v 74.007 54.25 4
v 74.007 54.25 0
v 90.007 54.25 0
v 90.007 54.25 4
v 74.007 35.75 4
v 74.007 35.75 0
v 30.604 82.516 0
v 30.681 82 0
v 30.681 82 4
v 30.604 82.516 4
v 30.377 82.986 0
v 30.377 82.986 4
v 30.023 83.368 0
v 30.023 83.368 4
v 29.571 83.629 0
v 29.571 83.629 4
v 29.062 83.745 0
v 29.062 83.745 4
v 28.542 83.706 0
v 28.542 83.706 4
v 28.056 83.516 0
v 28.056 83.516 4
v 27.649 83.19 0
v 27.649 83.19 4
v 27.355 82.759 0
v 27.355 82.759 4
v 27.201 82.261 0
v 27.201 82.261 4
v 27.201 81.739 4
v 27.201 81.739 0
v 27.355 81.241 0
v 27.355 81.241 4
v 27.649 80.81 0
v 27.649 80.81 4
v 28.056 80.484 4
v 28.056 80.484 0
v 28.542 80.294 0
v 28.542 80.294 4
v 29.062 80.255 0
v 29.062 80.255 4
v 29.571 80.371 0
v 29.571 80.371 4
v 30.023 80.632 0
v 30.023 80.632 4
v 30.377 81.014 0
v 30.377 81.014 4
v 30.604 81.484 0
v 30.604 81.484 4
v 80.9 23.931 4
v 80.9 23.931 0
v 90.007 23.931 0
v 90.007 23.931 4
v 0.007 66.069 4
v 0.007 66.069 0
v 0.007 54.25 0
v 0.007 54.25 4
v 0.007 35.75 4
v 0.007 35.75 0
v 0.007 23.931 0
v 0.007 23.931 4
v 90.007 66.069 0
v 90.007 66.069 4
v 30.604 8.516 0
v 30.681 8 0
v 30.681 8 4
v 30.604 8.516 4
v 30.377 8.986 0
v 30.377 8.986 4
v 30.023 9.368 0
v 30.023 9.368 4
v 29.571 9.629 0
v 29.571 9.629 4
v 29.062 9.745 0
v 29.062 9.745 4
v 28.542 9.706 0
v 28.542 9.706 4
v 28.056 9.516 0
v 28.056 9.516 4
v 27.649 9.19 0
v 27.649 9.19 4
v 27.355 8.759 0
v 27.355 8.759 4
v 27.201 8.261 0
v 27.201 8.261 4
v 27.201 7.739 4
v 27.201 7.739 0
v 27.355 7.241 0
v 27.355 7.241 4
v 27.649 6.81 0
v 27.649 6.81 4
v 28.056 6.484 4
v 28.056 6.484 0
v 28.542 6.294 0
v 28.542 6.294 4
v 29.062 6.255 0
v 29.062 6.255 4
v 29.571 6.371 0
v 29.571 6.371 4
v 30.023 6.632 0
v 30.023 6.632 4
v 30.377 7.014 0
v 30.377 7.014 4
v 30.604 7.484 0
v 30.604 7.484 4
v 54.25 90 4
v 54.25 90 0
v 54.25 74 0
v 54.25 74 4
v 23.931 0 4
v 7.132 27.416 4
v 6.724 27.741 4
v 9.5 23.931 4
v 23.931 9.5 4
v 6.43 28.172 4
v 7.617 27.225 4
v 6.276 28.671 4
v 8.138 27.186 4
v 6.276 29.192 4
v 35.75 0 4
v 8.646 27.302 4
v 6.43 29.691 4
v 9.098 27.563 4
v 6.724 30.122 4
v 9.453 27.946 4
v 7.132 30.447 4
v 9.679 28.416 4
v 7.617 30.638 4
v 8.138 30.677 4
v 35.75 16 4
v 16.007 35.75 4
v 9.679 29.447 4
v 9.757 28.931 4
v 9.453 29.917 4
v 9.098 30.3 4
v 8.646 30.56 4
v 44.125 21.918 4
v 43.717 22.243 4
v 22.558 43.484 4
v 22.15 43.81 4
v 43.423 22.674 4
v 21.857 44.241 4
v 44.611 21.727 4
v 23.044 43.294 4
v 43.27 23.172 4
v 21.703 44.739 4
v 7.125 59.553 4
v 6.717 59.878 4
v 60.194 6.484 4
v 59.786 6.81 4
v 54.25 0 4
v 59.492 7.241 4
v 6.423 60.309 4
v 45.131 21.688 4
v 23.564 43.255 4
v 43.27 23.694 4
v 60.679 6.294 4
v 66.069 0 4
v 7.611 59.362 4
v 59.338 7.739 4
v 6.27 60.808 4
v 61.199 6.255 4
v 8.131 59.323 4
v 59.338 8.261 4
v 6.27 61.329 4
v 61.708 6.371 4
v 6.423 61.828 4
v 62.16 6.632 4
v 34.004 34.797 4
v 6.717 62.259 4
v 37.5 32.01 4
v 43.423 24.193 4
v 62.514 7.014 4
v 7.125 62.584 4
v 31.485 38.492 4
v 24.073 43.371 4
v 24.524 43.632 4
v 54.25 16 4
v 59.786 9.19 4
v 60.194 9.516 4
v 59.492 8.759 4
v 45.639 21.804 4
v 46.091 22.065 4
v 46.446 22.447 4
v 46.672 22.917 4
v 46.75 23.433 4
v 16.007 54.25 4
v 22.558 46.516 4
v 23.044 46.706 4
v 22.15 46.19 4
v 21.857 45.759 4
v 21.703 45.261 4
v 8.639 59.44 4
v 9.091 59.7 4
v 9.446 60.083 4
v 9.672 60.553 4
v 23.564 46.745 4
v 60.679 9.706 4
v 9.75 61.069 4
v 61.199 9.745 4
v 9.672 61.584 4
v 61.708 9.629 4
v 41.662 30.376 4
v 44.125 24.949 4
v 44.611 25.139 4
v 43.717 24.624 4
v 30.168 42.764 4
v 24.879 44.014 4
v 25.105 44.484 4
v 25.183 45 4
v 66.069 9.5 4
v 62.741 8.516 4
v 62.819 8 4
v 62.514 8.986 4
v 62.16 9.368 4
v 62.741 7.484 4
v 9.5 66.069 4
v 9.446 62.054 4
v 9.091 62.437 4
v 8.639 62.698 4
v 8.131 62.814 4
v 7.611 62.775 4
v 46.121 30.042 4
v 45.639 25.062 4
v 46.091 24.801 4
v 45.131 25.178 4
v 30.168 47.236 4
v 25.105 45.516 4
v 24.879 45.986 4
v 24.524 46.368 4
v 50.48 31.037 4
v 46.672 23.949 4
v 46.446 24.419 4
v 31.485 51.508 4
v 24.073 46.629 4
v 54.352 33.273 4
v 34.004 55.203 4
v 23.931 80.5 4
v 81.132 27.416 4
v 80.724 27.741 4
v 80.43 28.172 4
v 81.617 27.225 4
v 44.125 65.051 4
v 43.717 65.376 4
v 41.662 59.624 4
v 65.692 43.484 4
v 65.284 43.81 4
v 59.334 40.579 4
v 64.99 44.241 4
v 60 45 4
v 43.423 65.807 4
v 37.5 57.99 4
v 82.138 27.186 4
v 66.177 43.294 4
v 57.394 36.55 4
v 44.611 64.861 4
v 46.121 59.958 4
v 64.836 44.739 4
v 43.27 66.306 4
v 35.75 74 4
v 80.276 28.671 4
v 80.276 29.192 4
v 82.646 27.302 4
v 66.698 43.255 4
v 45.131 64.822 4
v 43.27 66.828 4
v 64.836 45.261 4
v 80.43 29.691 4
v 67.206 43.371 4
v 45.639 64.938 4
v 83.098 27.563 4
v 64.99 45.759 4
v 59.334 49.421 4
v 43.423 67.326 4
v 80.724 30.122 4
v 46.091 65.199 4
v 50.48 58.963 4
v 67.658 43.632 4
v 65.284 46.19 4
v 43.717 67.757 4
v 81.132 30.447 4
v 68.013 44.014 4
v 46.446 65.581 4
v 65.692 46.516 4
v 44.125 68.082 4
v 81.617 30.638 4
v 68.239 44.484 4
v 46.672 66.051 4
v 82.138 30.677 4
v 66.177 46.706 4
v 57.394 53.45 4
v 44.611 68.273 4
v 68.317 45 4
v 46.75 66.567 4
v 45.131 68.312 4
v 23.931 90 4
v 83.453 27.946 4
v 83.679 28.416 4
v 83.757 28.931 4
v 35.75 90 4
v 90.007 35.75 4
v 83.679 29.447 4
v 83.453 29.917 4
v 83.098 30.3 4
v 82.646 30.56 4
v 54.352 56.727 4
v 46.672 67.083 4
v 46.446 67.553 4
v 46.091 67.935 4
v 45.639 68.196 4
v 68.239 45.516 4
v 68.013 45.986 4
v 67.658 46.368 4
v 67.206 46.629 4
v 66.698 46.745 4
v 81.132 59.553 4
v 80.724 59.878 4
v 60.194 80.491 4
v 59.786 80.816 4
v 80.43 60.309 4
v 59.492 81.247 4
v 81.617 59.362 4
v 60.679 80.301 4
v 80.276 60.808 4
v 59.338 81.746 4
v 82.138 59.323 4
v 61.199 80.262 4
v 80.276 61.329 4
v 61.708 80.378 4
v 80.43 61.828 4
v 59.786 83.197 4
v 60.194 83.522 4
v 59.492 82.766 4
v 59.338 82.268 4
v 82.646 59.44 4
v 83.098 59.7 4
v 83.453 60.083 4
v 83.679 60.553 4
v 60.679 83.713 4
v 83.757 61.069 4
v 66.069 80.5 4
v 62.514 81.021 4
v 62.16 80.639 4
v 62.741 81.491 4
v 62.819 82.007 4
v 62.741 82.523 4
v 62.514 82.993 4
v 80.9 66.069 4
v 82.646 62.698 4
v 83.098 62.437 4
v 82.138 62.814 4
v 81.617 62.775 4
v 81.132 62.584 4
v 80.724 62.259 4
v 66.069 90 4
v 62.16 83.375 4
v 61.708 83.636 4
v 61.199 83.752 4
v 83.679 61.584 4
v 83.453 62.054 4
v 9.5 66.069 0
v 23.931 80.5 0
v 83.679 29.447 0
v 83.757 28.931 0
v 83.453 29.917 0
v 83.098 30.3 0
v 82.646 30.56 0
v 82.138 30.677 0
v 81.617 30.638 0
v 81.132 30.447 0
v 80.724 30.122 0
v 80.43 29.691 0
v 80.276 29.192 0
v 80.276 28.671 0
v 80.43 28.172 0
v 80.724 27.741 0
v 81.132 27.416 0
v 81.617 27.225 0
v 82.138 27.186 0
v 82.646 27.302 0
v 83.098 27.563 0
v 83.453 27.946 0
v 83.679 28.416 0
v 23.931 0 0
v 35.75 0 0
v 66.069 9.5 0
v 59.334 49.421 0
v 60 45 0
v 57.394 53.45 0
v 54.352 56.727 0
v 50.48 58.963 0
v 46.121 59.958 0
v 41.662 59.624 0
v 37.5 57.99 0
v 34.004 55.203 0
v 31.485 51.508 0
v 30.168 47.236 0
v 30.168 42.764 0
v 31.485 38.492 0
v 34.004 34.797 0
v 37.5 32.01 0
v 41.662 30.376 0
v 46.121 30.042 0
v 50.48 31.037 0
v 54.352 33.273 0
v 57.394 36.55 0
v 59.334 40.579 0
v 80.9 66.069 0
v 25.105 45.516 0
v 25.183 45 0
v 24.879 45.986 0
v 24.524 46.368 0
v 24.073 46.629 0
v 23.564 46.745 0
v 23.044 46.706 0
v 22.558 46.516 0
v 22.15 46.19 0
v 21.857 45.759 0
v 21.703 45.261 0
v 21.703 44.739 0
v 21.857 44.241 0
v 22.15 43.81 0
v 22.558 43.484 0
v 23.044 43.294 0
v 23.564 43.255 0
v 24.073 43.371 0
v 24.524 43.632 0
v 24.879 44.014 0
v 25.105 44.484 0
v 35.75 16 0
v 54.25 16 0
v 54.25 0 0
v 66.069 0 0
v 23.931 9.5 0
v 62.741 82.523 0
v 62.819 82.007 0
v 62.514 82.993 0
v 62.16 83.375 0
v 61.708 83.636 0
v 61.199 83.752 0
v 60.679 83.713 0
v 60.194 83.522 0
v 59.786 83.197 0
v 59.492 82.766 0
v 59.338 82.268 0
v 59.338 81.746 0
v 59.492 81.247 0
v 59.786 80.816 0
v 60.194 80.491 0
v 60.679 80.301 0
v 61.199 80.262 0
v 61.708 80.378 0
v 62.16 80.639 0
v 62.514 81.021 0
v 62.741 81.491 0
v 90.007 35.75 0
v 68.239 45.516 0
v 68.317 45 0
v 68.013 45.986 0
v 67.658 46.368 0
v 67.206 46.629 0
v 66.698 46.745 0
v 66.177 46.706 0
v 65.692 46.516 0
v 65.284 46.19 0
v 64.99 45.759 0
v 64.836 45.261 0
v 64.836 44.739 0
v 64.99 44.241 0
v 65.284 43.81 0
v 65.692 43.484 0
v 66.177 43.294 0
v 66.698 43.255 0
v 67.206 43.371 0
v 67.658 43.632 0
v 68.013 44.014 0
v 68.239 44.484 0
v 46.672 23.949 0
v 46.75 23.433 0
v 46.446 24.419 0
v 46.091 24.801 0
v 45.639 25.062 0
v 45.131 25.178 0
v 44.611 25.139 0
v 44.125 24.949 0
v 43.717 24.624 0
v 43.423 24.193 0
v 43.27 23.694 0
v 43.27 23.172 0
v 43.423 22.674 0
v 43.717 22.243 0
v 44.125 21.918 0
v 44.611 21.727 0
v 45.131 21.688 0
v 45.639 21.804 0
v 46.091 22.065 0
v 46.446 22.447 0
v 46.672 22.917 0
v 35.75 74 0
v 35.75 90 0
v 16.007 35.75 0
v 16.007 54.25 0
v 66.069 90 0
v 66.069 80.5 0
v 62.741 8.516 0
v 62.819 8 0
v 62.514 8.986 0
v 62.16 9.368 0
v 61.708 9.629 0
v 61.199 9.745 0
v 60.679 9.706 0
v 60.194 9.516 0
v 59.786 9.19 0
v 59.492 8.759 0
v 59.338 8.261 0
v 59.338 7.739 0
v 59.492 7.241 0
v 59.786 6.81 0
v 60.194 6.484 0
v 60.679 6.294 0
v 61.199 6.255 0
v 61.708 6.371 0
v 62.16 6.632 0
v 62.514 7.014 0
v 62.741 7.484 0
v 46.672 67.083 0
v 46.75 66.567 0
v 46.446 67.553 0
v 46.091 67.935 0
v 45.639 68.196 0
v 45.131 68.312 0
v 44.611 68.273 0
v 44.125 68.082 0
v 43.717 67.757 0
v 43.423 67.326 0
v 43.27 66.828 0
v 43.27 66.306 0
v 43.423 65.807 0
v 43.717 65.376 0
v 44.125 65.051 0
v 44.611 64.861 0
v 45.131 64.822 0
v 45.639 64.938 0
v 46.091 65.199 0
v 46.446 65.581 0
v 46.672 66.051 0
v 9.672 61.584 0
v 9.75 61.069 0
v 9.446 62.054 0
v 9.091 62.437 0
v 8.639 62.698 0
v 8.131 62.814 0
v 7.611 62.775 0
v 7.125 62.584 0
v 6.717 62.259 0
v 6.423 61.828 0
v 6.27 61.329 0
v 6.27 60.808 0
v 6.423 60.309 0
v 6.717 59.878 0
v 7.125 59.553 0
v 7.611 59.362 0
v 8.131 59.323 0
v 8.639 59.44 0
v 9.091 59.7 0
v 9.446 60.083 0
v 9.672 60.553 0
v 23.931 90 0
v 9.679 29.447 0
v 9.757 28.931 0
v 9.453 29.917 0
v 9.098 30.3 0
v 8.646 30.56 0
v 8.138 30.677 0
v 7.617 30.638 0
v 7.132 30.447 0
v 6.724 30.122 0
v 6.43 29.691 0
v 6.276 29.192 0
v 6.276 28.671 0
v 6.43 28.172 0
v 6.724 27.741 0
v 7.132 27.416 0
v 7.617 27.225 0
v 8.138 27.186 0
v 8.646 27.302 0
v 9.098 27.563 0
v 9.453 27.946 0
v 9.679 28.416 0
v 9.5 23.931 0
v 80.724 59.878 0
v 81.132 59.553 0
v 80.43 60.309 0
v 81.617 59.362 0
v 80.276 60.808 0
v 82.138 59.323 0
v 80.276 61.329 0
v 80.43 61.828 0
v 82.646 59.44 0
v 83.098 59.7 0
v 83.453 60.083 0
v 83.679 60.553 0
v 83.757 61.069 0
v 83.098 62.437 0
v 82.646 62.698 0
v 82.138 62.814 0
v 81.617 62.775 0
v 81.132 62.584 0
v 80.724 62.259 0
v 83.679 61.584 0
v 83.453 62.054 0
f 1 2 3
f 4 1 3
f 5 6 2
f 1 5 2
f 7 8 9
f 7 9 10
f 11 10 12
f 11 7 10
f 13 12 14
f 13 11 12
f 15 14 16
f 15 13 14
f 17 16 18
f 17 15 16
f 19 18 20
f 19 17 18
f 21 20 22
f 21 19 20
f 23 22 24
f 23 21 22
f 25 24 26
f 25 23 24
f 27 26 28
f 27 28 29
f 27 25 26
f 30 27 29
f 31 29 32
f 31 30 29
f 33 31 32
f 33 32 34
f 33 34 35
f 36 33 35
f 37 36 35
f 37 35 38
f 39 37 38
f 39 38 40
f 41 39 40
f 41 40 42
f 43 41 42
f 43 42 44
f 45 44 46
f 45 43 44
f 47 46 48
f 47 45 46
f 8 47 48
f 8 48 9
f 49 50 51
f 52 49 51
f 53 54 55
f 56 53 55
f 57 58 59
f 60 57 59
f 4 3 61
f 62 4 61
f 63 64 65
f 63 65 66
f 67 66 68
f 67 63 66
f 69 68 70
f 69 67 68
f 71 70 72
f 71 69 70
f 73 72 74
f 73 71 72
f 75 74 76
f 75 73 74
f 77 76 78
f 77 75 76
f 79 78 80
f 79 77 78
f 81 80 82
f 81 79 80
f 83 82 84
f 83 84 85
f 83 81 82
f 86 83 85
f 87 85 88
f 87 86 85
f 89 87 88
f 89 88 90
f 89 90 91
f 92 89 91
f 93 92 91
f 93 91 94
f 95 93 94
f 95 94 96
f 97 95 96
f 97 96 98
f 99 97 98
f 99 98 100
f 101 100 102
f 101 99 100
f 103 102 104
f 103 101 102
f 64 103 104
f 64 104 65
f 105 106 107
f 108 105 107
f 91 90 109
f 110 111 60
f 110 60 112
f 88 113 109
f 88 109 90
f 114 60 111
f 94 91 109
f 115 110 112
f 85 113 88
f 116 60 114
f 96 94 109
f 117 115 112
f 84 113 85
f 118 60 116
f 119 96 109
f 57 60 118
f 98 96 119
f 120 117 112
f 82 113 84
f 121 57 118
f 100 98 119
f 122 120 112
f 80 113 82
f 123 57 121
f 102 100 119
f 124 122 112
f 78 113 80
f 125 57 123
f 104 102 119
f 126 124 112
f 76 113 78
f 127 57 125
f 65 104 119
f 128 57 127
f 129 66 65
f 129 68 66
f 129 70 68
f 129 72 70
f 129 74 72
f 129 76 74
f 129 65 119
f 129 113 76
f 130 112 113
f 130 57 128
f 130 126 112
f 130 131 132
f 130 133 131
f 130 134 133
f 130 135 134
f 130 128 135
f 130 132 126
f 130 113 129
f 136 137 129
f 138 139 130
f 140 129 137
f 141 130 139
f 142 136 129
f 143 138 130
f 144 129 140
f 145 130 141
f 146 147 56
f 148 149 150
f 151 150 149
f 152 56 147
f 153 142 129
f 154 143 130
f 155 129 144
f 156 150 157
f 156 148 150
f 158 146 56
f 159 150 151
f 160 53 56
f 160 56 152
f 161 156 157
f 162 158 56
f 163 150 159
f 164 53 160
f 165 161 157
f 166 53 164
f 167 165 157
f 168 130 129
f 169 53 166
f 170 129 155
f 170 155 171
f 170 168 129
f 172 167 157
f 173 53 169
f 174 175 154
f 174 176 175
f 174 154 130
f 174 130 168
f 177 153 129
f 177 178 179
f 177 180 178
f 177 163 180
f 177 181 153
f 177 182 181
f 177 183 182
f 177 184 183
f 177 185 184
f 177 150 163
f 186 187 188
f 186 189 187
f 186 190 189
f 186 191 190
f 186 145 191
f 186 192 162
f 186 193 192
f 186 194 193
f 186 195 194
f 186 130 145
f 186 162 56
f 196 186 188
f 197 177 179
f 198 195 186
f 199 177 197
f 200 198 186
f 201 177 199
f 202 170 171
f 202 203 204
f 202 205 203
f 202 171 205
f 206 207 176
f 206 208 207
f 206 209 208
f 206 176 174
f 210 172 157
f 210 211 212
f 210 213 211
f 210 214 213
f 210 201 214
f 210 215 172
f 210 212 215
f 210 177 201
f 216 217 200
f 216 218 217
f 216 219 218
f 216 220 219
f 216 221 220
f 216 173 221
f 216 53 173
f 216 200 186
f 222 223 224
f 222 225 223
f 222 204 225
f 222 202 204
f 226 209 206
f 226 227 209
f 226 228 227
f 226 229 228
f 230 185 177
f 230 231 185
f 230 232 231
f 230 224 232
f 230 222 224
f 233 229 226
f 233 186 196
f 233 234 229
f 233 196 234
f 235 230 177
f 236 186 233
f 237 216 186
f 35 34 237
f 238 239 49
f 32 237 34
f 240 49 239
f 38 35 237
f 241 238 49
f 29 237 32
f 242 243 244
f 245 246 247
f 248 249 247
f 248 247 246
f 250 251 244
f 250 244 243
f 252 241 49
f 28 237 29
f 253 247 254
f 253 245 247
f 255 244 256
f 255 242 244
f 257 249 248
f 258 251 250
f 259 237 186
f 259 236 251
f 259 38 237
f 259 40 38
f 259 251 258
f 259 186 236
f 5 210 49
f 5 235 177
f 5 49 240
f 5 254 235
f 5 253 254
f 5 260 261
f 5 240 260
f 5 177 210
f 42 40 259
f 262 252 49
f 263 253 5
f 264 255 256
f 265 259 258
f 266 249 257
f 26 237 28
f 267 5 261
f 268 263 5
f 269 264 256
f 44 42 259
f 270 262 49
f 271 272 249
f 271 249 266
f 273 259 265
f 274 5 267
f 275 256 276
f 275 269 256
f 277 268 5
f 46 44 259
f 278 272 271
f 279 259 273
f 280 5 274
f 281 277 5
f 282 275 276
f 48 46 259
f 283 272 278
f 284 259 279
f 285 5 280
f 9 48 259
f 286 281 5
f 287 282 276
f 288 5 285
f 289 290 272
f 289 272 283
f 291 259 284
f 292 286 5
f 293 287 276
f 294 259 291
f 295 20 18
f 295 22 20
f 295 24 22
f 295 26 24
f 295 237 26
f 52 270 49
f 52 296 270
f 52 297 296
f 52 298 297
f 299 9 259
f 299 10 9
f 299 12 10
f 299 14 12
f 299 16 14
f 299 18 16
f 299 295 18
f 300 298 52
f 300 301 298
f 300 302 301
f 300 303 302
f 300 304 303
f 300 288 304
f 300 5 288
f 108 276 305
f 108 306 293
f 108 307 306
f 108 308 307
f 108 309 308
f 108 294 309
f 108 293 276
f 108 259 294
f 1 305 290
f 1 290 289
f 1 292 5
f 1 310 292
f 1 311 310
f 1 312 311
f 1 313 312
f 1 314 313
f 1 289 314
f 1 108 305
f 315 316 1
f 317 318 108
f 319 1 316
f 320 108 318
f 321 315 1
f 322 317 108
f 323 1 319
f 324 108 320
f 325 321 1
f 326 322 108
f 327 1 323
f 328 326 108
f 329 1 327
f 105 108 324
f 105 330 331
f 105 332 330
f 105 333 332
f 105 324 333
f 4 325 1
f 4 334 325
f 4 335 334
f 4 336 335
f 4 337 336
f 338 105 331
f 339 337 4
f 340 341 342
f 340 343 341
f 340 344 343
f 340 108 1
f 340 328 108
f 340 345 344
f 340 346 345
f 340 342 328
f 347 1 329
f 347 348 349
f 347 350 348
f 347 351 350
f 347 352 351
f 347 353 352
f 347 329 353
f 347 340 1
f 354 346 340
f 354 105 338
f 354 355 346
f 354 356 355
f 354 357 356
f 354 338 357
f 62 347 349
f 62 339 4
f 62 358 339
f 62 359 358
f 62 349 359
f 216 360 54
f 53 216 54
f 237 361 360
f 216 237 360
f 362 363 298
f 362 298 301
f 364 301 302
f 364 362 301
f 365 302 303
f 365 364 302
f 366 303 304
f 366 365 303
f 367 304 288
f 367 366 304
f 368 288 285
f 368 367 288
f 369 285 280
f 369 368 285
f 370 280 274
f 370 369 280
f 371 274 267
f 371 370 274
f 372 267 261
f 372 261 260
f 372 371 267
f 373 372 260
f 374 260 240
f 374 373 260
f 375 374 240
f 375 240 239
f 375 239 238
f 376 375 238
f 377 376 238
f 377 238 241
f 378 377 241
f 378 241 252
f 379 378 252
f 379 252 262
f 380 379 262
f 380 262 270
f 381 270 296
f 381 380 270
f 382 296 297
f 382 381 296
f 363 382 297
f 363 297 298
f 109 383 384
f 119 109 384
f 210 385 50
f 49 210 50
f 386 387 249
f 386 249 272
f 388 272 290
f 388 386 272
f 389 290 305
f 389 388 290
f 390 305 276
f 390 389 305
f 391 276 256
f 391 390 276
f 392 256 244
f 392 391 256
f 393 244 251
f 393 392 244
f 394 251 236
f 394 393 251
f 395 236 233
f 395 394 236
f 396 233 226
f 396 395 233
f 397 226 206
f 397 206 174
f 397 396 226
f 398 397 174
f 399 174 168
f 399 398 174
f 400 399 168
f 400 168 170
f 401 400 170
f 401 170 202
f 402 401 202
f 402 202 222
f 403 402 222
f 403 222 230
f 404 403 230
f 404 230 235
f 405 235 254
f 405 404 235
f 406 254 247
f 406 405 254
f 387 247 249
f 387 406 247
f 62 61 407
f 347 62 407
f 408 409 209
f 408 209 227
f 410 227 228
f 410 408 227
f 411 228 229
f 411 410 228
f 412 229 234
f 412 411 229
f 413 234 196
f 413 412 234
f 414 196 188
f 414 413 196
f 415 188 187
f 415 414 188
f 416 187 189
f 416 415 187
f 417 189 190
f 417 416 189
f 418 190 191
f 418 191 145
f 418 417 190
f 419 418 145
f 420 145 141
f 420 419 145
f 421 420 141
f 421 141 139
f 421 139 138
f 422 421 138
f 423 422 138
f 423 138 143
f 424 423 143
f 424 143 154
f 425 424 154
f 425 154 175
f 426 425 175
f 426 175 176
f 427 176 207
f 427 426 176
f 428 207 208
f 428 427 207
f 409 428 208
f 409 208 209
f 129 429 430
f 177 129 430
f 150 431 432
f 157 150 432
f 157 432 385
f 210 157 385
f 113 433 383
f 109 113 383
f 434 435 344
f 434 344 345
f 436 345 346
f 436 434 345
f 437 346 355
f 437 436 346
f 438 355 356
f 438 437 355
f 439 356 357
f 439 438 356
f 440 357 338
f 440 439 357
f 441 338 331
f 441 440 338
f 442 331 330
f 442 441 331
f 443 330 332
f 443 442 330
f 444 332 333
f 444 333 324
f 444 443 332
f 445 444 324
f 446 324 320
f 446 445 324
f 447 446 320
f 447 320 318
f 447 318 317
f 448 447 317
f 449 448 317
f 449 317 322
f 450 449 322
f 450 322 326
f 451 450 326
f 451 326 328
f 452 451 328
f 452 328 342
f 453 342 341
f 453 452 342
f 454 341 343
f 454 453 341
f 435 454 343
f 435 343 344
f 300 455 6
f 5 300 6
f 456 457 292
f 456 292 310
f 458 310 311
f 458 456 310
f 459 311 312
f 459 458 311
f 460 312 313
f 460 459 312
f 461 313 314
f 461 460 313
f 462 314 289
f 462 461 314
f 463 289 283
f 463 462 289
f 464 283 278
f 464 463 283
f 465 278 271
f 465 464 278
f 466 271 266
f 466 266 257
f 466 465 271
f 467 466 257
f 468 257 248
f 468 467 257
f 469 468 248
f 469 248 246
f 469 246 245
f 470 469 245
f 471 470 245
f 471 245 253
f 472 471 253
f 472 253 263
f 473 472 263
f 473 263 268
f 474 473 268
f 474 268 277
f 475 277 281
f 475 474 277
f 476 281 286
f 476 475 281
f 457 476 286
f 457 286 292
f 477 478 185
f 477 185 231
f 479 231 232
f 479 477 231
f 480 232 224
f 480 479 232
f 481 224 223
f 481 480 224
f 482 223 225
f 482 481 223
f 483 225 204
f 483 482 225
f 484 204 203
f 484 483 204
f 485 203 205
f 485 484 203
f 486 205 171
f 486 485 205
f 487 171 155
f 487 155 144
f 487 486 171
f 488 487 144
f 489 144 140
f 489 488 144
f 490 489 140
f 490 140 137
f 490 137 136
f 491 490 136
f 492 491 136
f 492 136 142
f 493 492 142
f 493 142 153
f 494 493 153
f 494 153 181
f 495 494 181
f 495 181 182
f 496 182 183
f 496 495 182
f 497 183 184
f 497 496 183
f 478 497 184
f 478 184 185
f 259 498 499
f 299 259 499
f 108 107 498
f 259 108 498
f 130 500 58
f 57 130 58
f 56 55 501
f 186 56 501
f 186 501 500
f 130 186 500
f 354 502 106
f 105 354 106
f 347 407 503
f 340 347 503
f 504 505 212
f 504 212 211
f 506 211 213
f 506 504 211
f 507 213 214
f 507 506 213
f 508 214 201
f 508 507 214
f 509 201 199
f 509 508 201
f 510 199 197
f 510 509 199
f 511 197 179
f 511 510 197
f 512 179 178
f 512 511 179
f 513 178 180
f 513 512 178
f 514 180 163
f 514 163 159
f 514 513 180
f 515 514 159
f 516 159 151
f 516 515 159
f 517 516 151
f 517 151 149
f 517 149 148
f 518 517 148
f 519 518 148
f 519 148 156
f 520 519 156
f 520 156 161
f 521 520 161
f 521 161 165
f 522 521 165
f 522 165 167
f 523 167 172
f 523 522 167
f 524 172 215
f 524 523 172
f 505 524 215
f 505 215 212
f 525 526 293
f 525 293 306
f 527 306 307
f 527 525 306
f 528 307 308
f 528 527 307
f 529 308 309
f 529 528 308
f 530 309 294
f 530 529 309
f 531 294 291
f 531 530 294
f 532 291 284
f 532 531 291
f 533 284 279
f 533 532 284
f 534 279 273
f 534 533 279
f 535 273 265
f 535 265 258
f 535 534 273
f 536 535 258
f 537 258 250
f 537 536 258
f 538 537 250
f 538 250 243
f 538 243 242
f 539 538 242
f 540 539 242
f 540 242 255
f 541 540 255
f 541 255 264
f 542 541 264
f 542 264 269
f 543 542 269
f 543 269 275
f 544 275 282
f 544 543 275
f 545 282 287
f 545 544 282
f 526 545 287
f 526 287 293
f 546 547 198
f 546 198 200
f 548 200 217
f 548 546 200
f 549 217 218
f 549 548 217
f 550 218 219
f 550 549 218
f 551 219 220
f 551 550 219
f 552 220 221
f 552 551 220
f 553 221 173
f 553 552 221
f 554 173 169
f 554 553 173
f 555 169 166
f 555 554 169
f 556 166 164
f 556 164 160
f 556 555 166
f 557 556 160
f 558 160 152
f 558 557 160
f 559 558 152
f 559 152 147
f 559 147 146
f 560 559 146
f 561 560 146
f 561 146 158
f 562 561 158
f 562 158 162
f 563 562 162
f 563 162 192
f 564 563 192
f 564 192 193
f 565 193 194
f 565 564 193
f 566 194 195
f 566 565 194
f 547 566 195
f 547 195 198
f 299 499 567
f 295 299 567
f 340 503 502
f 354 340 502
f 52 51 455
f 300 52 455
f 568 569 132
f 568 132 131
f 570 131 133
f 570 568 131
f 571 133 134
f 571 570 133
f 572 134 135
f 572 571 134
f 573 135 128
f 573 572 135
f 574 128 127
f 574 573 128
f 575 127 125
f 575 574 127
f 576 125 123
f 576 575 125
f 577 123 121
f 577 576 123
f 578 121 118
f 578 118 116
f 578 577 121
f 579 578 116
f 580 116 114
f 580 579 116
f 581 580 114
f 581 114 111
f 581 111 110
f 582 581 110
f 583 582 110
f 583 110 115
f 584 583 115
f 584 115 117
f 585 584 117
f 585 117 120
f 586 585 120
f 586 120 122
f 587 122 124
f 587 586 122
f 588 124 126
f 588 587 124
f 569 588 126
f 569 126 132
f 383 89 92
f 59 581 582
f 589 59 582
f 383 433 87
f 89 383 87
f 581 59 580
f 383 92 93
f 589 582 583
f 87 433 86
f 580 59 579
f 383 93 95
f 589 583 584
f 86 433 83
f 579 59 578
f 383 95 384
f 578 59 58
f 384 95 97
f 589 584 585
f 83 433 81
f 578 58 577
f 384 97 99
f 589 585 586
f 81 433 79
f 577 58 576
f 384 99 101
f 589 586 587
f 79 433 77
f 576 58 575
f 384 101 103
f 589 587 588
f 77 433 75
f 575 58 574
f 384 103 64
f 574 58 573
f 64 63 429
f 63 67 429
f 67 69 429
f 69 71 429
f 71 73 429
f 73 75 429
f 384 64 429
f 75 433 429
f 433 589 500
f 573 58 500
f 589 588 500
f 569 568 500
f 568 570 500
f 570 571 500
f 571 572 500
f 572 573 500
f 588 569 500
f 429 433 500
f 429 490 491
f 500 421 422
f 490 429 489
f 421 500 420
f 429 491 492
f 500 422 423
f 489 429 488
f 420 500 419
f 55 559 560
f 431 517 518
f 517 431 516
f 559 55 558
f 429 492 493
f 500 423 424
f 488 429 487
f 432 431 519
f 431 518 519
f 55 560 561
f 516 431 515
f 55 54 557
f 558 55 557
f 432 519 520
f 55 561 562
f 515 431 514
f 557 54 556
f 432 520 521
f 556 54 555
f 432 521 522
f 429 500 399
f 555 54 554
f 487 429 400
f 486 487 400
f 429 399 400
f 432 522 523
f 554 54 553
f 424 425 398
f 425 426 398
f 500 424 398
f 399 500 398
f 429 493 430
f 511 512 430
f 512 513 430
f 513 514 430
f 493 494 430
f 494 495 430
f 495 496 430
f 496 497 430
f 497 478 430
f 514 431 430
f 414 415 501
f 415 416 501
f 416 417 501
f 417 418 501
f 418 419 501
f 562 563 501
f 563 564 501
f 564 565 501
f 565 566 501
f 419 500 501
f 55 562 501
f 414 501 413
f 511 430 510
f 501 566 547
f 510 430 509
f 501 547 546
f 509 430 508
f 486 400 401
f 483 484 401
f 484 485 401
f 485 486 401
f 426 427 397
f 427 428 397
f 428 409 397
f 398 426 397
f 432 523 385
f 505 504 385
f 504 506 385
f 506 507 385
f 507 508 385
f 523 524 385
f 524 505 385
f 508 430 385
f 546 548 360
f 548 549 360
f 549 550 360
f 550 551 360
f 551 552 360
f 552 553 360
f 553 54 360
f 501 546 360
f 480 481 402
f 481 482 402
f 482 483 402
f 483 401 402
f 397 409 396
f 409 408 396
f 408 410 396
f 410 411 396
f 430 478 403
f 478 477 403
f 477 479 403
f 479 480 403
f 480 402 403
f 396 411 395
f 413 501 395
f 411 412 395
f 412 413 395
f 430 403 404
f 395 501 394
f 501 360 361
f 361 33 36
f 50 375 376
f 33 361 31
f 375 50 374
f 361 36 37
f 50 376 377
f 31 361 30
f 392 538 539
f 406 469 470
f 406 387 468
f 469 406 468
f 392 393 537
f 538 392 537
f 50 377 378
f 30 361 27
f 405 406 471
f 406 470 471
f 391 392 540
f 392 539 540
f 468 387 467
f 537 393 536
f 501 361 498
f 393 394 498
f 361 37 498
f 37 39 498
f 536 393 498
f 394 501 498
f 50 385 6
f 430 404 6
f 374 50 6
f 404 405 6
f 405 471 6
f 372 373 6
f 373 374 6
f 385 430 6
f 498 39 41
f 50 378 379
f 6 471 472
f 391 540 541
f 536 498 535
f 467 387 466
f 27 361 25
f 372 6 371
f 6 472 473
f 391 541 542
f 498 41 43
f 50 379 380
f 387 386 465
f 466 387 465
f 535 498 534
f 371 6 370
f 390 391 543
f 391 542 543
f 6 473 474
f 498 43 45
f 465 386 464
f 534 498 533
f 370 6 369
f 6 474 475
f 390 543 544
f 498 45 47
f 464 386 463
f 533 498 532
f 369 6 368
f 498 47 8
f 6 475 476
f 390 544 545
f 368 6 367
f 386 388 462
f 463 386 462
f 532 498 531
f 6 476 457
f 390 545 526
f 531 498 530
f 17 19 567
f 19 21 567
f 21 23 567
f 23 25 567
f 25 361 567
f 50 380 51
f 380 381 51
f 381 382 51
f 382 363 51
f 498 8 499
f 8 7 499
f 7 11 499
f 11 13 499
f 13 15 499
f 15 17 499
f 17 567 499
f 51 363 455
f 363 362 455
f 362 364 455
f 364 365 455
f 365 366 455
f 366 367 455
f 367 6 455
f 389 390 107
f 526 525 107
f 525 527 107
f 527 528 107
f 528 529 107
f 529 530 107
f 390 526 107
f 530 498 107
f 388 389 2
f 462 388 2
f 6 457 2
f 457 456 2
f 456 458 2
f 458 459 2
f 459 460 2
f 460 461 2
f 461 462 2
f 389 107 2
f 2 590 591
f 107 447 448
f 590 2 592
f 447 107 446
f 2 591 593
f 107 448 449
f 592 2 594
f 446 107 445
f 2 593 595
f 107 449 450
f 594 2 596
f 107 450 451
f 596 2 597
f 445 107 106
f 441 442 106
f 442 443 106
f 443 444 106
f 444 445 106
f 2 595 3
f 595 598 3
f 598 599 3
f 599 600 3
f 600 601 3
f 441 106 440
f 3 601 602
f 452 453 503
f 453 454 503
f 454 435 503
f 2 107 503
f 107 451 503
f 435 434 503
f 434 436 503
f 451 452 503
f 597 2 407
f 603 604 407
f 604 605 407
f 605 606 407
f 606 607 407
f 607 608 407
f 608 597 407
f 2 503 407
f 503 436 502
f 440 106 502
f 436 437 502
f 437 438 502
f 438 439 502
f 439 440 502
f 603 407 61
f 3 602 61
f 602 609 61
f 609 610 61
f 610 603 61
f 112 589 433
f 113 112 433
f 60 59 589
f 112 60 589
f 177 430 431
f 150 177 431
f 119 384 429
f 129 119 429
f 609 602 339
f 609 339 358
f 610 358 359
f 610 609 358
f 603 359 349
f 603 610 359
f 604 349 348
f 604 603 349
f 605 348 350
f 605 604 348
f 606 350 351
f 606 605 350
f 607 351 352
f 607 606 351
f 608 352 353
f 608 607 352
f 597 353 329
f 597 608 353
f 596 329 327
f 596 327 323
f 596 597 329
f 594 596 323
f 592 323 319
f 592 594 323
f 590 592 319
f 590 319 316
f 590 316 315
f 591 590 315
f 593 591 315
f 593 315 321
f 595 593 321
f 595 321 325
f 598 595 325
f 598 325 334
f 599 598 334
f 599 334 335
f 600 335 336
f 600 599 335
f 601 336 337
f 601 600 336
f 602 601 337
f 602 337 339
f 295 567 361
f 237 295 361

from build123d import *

# Parameters (mm, degrees)
F0_R     = 1.75
F0_R_2   = 15
F1_DEPTH = 4


with BuildPart() as f1:
    # F0 (on Top) → F1 (new body)
    with BuildSketch(Plane.XY):
        Polygon((23.931458, 9.5), (23.931458, 0), (35.75, 0), (35.75, 16), (54.25, 16), (54.25, 0), (66.068542, 0), (66.068542, 9.5), (80.900239, 23.931458), (90.006756, 23.931458), (90.006756, 35.75), (74.006756, 35.75), (74.006756, 54.25), (90.006756, 54.25), (90.006756, 66.068542), (80.900239, 66.068542), (66.068542, 80.5), (66.068542, 90), (54.25, 90), (54.25, 74), (35.75, 74), (35.75, 90), (23.931458, 90), (23.931458, 80.5), (9.5, 66.068542), (0.006756, 66.068542), (0.006756, 54.25), (16.006756, 54.25), (16.006756, 35.75), (0.006756, 35.75), (0.006756, 23.931458), (9.5, 23.931458), align=None)
        with Locations((28.931458, 8)):
            Circle(F0_R, mode=Mode.SUBTRACT)
        with Locations((8.006756, 28.931458)):
            Circle(F0_R, mode=Mode.SUBTRACT)
        with Locations((45, 23.433243)):
            Circle(F0_R, mode=Mode.SUBTRACT)
        with Locations((61.068542, 8)):
            Circle(F0_R, mode=Mode.SUBTRACT)
        with Locations((82.006757, 28.931458)):
            Circle(F0_R, mode=Mode.SUBTRACT)
        with Locations((8, 61.068542)):
            Circle(F0_R, mode=Mode.SUBTRACT)
        with Locations((23.433243, 45)):
            Circle(F0_R, mode=Mode.SUBTRACT)
        with Locations((45, 45)):
            Circle(F0_R_2, mode=Mode.SUBTRACT)
        with Locations((45, 66.566757)):
            Circle(F0_R, mode=Mode.SUBTRACT)
        with Locations((28.931458, 82)):
            Circle(F0_R, mode=Mode.SUBTRACT)
        with Locations((66.566757, 45)):
            Circle(F0_R, mode=Mode.SUBTRACT)
        with Locations((82.006756, 61.068542)):
            Circle(F0_R, mode=Mode.SUBTRACT)
        with Locations((61.068542, 82.006756)):
            Circle(F0_R, mode=Mode.SUBTRACT)
    extrude(amount=F1_DEPTH)


solid = f1.part
